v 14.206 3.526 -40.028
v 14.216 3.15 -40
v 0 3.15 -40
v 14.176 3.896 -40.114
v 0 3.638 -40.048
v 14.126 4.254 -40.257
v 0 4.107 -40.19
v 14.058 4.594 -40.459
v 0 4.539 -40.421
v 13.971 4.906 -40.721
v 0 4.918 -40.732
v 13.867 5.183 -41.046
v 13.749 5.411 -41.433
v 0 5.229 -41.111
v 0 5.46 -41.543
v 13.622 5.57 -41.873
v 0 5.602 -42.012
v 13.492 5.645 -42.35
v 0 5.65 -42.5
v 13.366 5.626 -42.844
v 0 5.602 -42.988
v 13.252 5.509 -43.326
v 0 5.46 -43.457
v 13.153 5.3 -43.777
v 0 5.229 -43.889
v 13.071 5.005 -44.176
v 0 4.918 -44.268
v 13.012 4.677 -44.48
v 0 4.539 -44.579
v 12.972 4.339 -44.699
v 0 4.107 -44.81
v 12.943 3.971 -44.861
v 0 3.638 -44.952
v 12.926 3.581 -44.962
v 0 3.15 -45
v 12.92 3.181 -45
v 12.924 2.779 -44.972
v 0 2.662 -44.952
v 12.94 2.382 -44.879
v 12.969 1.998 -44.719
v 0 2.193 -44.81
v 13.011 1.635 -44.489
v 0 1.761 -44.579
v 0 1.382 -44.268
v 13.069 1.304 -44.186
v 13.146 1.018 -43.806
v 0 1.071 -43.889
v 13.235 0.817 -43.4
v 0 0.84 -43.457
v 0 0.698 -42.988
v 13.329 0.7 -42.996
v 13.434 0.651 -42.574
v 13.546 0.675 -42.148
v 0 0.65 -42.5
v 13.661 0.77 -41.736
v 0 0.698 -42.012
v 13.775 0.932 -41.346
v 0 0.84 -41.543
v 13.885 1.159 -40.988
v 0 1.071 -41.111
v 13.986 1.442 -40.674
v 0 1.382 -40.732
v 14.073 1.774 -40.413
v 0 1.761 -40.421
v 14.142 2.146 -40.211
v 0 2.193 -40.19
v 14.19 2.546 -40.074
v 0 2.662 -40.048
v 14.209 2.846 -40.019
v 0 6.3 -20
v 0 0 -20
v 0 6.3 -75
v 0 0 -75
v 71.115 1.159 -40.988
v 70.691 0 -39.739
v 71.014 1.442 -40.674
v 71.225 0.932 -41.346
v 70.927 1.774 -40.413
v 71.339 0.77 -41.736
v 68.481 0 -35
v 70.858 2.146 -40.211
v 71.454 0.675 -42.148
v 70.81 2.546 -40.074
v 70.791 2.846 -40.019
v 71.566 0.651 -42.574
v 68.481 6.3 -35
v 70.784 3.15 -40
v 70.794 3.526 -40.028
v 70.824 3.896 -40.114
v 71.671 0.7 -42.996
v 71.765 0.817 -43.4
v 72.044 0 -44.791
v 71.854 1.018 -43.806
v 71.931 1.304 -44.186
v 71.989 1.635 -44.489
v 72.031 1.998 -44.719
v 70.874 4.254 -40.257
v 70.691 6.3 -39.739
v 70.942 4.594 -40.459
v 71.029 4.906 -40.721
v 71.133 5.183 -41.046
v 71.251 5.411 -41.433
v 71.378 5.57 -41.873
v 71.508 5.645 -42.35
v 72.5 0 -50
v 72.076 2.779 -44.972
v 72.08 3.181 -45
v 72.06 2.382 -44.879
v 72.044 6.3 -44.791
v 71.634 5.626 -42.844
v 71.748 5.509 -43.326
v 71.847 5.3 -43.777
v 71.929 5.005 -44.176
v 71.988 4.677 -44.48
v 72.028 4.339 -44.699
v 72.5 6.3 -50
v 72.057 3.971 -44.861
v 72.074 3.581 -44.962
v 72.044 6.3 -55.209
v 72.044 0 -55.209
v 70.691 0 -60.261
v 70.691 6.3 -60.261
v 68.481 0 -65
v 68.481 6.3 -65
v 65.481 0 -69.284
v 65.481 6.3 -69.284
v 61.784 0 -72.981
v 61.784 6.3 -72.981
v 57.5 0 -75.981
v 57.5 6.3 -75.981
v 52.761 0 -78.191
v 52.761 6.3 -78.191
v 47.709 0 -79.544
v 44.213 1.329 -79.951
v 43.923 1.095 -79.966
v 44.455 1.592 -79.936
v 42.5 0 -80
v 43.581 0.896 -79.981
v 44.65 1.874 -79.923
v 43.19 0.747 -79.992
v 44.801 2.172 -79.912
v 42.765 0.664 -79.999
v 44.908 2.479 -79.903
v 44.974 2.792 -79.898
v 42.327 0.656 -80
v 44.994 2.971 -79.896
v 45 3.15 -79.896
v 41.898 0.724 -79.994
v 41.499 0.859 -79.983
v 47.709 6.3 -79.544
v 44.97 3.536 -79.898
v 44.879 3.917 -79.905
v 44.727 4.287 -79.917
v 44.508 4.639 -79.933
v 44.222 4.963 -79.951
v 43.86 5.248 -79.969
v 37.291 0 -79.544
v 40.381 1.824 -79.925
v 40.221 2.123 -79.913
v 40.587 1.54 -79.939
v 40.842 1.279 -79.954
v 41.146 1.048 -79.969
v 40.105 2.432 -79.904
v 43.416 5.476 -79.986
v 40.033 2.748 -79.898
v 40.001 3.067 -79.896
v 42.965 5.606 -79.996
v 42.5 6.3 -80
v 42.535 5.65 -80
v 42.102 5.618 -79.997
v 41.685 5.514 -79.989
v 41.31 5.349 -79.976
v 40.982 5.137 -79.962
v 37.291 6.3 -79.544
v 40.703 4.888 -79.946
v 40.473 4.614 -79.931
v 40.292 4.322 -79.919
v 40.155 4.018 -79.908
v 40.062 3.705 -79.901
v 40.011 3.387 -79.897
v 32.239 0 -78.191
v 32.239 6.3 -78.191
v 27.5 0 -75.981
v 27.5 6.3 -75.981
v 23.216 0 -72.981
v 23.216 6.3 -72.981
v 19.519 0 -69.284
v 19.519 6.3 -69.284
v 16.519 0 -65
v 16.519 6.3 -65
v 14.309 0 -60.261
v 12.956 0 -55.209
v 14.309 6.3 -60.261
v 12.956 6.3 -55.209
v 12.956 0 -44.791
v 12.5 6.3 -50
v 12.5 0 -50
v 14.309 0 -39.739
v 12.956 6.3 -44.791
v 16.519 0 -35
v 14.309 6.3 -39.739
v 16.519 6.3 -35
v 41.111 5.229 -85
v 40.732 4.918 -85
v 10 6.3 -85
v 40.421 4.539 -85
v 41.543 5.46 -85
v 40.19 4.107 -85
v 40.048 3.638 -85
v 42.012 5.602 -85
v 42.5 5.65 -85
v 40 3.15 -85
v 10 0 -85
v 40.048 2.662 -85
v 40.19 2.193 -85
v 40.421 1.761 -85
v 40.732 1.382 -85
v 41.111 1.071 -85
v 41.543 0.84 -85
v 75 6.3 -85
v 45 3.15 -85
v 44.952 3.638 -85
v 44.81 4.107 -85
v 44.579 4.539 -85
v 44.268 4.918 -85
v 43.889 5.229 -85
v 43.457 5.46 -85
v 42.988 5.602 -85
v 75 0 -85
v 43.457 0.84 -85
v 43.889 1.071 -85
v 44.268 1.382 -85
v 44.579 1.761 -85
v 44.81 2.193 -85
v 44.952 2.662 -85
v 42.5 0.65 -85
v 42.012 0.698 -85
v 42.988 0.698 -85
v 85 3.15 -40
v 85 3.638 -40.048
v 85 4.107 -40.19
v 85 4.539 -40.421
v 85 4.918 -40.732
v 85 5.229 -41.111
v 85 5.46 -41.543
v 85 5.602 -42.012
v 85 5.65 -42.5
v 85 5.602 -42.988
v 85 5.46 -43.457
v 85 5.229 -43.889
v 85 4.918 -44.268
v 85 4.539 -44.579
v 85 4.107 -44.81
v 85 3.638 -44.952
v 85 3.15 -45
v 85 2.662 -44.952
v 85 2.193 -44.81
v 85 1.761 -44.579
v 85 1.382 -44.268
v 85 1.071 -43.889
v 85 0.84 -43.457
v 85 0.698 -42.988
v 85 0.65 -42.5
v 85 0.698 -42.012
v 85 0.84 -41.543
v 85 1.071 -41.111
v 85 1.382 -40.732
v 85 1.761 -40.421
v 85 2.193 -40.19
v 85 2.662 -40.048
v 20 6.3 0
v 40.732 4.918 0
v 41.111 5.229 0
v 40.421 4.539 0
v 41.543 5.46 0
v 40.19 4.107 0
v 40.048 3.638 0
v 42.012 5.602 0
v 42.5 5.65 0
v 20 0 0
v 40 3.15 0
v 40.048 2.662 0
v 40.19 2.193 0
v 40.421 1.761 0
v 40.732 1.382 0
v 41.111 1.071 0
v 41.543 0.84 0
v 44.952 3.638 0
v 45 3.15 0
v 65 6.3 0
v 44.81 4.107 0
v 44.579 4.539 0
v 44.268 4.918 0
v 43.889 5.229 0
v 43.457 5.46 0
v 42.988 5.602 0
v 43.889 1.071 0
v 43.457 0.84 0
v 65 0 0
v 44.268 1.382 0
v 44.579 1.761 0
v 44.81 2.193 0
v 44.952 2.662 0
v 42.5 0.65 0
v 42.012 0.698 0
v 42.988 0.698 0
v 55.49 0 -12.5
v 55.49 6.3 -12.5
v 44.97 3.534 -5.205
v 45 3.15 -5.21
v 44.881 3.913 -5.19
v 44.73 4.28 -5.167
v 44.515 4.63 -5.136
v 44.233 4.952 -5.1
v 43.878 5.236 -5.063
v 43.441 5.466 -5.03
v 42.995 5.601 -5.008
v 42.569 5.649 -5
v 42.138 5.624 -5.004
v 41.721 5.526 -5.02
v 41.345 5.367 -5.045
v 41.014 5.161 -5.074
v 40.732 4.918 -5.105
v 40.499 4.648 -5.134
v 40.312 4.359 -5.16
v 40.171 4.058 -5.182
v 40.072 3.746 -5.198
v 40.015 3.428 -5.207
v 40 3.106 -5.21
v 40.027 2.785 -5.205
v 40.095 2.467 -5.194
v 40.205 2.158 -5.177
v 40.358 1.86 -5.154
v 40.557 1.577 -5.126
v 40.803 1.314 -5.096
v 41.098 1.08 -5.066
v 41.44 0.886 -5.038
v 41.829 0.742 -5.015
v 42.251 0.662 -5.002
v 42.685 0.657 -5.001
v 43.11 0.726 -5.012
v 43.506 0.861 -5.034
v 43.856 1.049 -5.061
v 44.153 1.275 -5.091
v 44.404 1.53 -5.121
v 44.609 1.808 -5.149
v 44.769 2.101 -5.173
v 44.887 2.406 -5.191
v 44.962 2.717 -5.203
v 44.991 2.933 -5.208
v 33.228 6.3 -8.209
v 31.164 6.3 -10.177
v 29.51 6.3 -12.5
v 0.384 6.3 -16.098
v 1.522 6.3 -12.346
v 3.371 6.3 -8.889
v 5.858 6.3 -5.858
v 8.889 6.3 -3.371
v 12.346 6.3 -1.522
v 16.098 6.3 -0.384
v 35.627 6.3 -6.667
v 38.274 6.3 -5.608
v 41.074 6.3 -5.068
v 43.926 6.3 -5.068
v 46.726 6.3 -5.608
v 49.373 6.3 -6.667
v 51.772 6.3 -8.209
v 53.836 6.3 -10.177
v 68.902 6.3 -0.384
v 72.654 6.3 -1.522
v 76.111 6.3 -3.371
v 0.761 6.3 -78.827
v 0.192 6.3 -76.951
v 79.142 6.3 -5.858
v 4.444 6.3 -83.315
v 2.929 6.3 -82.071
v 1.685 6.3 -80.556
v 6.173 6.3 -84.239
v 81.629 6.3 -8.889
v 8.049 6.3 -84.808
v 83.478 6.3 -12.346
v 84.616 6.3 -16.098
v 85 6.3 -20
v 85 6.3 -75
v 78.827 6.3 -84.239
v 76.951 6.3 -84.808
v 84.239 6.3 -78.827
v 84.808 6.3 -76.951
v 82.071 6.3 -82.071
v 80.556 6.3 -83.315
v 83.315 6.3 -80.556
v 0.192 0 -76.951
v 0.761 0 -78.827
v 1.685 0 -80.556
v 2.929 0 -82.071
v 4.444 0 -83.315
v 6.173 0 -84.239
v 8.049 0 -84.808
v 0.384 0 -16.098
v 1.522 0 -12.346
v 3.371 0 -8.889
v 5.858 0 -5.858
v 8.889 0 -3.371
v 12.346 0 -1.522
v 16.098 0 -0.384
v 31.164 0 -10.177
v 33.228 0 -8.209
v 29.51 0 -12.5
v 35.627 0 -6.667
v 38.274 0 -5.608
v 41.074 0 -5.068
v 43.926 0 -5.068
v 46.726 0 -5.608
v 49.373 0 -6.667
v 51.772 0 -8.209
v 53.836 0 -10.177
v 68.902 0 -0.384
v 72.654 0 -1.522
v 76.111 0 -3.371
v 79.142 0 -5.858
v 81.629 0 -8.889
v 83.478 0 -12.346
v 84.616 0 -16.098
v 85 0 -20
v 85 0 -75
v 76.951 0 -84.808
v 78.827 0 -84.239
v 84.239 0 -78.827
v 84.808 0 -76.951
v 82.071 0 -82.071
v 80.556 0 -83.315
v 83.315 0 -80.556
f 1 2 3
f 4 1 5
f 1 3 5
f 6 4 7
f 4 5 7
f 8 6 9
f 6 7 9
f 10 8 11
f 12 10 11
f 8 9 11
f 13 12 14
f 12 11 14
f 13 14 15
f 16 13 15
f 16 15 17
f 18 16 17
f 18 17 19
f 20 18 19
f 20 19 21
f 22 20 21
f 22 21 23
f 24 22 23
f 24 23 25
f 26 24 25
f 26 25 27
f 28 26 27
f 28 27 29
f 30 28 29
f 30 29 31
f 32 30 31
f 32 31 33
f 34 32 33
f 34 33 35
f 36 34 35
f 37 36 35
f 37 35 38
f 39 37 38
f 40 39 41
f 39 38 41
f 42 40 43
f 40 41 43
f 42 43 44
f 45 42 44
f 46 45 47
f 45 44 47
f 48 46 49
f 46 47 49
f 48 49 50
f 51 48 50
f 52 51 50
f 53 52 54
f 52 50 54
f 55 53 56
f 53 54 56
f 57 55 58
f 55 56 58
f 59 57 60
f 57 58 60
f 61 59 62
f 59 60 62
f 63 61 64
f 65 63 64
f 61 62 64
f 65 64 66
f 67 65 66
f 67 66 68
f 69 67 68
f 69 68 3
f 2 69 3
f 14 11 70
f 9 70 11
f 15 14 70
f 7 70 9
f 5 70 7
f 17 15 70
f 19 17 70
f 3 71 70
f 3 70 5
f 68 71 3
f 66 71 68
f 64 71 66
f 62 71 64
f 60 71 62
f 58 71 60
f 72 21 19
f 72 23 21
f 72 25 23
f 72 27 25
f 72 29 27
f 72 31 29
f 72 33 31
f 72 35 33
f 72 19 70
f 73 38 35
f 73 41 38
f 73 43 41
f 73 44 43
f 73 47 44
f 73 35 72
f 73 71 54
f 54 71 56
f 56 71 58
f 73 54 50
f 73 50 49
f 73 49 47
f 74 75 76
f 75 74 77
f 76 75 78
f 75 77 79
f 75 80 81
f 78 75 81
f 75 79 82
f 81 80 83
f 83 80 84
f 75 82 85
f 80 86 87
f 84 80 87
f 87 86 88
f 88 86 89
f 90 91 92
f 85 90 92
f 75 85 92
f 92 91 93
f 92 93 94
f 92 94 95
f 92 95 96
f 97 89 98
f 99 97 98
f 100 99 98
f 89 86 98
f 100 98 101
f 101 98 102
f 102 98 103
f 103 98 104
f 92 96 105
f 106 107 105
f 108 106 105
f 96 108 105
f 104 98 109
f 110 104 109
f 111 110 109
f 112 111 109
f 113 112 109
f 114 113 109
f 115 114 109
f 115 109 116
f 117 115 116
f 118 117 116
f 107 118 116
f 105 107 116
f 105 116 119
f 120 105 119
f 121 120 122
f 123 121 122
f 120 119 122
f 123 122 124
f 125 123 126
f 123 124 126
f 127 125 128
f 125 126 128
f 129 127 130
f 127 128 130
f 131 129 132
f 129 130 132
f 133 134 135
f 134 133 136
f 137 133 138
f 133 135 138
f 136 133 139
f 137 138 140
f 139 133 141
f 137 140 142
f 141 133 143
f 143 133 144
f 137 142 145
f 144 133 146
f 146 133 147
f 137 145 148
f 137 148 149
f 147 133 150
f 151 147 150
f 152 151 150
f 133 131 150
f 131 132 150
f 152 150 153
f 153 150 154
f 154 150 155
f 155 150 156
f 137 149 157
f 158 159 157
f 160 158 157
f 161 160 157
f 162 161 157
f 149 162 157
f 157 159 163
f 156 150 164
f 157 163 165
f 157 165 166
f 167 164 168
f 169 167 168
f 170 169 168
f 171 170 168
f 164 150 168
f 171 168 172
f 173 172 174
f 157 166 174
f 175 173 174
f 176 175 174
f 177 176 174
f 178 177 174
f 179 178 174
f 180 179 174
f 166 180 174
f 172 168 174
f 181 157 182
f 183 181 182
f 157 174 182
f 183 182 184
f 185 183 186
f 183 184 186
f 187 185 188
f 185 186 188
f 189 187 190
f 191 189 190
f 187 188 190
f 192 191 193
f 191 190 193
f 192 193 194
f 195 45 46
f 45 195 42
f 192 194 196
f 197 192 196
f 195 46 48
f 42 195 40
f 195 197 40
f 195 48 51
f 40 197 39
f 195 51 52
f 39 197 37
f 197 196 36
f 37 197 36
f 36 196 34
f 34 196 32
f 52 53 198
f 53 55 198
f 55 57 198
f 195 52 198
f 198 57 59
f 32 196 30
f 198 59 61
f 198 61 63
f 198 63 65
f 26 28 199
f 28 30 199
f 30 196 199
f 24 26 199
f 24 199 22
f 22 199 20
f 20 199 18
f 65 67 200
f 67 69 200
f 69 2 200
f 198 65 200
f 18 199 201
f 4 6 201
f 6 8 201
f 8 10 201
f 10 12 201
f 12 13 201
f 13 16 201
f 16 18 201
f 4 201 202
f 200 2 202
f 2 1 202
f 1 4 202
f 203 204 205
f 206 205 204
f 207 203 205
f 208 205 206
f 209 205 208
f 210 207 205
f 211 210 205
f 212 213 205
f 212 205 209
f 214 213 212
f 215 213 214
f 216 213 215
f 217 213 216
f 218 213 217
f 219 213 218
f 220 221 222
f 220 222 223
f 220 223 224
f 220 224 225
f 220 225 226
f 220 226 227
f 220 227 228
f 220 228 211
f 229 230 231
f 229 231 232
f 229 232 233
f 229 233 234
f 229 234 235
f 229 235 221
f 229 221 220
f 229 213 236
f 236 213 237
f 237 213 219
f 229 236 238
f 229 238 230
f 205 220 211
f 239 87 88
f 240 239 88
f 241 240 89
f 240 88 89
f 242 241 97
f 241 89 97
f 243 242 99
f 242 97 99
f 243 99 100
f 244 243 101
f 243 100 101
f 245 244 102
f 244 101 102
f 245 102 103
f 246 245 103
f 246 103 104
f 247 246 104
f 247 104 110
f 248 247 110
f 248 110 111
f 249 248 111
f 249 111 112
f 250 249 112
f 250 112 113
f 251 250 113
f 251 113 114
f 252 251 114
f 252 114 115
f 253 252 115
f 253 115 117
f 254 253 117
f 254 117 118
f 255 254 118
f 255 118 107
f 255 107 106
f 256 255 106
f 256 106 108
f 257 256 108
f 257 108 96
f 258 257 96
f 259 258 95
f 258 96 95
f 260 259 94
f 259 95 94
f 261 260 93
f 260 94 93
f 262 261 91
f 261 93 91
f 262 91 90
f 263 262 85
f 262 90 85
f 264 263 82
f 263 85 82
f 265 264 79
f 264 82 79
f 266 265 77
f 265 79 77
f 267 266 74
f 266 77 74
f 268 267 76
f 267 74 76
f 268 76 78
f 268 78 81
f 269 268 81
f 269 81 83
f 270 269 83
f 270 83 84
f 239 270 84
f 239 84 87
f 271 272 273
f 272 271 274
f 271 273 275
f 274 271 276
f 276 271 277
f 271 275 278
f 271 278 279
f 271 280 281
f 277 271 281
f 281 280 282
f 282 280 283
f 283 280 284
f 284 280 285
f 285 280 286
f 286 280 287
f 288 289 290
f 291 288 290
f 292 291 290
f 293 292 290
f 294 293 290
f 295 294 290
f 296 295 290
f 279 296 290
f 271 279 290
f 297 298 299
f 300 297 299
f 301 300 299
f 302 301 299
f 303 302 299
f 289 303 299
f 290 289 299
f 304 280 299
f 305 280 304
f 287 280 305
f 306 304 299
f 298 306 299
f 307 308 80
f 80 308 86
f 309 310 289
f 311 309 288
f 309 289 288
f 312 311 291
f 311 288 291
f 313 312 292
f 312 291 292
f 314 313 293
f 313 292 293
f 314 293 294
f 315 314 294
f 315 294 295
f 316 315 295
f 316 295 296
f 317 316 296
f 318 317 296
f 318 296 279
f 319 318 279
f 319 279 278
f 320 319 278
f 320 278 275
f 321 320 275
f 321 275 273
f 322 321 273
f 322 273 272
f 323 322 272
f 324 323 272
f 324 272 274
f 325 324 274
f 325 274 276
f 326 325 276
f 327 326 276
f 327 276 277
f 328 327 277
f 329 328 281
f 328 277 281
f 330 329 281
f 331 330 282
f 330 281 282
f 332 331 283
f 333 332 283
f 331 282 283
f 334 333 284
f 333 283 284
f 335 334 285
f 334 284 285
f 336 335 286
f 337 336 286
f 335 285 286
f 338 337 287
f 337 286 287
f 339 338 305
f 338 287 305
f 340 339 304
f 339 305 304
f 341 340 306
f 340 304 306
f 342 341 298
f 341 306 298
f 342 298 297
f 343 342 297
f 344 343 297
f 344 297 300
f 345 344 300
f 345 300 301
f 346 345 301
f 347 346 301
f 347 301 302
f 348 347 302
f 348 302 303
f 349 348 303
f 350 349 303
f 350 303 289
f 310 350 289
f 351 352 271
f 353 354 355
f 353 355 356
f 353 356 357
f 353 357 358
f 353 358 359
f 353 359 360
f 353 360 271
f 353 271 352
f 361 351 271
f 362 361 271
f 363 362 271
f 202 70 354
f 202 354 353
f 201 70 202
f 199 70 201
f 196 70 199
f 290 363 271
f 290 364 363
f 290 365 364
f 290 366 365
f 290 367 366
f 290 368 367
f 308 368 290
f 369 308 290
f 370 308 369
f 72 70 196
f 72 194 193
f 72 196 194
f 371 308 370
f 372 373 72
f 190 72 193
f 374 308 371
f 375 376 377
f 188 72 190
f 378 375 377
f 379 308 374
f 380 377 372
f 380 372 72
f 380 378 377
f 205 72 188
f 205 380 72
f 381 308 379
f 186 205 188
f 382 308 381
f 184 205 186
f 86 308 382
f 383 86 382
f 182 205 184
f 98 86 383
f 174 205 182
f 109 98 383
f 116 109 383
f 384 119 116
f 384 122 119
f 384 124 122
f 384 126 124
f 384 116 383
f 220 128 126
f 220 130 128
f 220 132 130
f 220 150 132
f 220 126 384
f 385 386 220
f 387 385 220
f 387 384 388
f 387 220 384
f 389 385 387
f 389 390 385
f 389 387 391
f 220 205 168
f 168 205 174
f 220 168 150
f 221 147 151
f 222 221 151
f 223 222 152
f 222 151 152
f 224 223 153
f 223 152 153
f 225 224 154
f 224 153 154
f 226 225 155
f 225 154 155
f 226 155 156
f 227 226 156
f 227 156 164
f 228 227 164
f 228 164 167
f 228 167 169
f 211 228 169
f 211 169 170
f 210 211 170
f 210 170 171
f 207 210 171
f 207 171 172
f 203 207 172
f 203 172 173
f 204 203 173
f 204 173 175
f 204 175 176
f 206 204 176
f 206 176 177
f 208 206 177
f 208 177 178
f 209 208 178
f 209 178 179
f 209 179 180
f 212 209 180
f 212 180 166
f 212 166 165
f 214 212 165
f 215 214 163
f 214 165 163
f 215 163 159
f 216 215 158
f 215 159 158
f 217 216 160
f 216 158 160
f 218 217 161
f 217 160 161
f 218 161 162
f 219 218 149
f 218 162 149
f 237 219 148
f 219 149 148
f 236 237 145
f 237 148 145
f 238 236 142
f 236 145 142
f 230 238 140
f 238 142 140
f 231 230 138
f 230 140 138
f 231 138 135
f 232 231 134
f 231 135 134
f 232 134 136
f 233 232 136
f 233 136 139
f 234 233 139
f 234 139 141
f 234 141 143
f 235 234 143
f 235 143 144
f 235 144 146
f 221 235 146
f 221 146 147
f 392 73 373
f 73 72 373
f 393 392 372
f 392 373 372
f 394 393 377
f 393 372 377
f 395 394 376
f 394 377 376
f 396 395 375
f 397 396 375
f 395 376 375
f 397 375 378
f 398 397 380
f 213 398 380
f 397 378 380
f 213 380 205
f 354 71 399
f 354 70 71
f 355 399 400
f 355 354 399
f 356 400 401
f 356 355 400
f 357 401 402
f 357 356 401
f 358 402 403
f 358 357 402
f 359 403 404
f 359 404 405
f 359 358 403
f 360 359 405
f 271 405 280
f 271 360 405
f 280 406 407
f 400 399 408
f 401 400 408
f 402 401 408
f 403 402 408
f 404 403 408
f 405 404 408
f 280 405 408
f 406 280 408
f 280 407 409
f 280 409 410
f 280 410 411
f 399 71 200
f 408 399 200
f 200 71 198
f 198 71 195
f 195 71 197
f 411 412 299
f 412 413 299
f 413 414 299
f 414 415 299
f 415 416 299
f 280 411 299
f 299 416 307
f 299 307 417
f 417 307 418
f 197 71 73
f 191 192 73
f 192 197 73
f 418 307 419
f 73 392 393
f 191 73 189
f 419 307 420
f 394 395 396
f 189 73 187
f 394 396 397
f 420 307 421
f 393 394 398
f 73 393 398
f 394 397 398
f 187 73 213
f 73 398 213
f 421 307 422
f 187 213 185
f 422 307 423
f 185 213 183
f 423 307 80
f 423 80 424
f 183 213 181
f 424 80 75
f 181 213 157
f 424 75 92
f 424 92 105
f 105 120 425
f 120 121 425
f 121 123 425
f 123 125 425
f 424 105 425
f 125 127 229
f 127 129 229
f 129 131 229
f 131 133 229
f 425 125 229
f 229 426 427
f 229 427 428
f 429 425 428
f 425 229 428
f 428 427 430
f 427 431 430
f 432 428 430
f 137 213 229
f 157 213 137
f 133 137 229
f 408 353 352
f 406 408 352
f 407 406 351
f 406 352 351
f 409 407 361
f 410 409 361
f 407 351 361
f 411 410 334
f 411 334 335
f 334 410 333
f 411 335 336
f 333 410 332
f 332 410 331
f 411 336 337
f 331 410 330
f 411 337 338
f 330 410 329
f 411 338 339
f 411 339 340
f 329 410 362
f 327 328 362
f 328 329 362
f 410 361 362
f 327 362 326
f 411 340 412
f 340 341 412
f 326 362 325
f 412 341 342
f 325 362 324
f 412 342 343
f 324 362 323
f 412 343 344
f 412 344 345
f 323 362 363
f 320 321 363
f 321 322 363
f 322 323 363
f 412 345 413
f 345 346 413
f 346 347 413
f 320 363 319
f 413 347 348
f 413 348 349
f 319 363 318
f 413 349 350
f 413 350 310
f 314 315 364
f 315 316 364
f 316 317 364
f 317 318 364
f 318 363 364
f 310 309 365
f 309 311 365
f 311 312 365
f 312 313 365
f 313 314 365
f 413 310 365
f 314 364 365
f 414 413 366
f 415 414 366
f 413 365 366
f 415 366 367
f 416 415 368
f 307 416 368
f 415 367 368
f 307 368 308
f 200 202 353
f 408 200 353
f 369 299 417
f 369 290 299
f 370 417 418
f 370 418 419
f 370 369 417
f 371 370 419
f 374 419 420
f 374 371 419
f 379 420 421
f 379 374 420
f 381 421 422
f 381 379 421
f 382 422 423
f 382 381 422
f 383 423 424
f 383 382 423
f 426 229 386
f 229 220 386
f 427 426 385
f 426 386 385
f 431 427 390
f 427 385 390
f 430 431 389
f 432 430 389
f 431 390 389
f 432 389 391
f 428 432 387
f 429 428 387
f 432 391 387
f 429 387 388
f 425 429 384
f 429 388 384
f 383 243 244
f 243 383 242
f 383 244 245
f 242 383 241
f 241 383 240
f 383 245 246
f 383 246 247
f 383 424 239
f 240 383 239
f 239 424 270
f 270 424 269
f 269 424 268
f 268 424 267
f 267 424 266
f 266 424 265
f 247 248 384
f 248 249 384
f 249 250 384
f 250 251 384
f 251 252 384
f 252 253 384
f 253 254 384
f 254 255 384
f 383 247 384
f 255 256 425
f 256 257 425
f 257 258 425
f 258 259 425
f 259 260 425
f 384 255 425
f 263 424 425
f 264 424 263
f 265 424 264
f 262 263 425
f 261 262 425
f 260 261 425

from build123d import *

# Parameters (mm, degrees)
SKETCH1_W           = 85
SKETCH1_H           = 85
BOSS_EXTRUDE1_DEPTH = 6.3
CUT_EXTRUDE1_DEPTH  = 10
SKETCH3_R           = 2.5
CUT_EXTRUDE2_DEPTH  = 86
SKETCH4_R           = 2.5
CUT_EXTRUDE3_DEPTH  = 86
FILLET1_R           = 20
FILLET2_R           = 10


with BuildPart() as part:
    # Sketch1 → Boss-Extrude1 (new body)
    with BuildSketch(Plane(origin=(0, 0, 0), x_dir=(1, 0, 0), z_dir=(0, 1, 0))):
        with Locations((42.5, 42.5)):
            Rectangle(SKETCH1_W, SKETCH1_H)
    extrude(amount=BOSS_EXTRUDE1_DEPTH)

    # Sketch2 → Cut-Extrude1 (cut)
    with BuildSketch(Plane(origin=(0, 6.3, 0), x_dir=(1, 0, 0), z_dir=(0, 1, 0))):
        with BuildLine():
            Line((16.519237886, 35), (29.509618943, 12.5))
            ThreePointArc((29.509618943, 12.5), (42.5, 5), (55.490381057, 12.5))
            Line((55.490381057, 12.5), (68.480762114, 35))
            ThreePointArc((68.480762114, 35), (42.5, 80), (16.519237886, 35))
        make_face()
    extrude(amount=-CUT_EXTRUDE1_DEPTH, mode=Mode.SUBTRACT)

    # Sketch3 → Cut-Extrude2 (cut, through all)
    with BuildSketch(Plane.XY):
        with Locations((42.5, 3.15)):
            Circle(SKETCH3_R)
    extrude(amount=-CUT_EXTRUDE2_DEPTH, mode=Mode.SUBTRACT)

    # Sketch4 → Cut-Extrude3 (cut, through all)
    with BuildSketch(Plane.ZY):
        with Locations((-42.5, 3.15)):
            Circle(SKETCH4_R)
    extrude(amount=-CUT_EXTRUDE3_DEPTH, mode=Mode.SUBTRACT)

    # Fillet1
    fillet1_edges = [part.edges().sort_by_distance(p)[0] for p in [
        (85, 3.15, 0),
        (0, 3.15, 0),
    ]]
    fillet(fillet1_edges, radius=FILLET1_R)

    # Fillet2
    fillet2_edges = [part.edges().sort_by_distance(p)[0] for p in [
        (0, 3.15, -85),
        (85, 3.15, -85),
    ]]
    fillet(fillet2_edges, radius=FILLET2_R)


solid = part.part
